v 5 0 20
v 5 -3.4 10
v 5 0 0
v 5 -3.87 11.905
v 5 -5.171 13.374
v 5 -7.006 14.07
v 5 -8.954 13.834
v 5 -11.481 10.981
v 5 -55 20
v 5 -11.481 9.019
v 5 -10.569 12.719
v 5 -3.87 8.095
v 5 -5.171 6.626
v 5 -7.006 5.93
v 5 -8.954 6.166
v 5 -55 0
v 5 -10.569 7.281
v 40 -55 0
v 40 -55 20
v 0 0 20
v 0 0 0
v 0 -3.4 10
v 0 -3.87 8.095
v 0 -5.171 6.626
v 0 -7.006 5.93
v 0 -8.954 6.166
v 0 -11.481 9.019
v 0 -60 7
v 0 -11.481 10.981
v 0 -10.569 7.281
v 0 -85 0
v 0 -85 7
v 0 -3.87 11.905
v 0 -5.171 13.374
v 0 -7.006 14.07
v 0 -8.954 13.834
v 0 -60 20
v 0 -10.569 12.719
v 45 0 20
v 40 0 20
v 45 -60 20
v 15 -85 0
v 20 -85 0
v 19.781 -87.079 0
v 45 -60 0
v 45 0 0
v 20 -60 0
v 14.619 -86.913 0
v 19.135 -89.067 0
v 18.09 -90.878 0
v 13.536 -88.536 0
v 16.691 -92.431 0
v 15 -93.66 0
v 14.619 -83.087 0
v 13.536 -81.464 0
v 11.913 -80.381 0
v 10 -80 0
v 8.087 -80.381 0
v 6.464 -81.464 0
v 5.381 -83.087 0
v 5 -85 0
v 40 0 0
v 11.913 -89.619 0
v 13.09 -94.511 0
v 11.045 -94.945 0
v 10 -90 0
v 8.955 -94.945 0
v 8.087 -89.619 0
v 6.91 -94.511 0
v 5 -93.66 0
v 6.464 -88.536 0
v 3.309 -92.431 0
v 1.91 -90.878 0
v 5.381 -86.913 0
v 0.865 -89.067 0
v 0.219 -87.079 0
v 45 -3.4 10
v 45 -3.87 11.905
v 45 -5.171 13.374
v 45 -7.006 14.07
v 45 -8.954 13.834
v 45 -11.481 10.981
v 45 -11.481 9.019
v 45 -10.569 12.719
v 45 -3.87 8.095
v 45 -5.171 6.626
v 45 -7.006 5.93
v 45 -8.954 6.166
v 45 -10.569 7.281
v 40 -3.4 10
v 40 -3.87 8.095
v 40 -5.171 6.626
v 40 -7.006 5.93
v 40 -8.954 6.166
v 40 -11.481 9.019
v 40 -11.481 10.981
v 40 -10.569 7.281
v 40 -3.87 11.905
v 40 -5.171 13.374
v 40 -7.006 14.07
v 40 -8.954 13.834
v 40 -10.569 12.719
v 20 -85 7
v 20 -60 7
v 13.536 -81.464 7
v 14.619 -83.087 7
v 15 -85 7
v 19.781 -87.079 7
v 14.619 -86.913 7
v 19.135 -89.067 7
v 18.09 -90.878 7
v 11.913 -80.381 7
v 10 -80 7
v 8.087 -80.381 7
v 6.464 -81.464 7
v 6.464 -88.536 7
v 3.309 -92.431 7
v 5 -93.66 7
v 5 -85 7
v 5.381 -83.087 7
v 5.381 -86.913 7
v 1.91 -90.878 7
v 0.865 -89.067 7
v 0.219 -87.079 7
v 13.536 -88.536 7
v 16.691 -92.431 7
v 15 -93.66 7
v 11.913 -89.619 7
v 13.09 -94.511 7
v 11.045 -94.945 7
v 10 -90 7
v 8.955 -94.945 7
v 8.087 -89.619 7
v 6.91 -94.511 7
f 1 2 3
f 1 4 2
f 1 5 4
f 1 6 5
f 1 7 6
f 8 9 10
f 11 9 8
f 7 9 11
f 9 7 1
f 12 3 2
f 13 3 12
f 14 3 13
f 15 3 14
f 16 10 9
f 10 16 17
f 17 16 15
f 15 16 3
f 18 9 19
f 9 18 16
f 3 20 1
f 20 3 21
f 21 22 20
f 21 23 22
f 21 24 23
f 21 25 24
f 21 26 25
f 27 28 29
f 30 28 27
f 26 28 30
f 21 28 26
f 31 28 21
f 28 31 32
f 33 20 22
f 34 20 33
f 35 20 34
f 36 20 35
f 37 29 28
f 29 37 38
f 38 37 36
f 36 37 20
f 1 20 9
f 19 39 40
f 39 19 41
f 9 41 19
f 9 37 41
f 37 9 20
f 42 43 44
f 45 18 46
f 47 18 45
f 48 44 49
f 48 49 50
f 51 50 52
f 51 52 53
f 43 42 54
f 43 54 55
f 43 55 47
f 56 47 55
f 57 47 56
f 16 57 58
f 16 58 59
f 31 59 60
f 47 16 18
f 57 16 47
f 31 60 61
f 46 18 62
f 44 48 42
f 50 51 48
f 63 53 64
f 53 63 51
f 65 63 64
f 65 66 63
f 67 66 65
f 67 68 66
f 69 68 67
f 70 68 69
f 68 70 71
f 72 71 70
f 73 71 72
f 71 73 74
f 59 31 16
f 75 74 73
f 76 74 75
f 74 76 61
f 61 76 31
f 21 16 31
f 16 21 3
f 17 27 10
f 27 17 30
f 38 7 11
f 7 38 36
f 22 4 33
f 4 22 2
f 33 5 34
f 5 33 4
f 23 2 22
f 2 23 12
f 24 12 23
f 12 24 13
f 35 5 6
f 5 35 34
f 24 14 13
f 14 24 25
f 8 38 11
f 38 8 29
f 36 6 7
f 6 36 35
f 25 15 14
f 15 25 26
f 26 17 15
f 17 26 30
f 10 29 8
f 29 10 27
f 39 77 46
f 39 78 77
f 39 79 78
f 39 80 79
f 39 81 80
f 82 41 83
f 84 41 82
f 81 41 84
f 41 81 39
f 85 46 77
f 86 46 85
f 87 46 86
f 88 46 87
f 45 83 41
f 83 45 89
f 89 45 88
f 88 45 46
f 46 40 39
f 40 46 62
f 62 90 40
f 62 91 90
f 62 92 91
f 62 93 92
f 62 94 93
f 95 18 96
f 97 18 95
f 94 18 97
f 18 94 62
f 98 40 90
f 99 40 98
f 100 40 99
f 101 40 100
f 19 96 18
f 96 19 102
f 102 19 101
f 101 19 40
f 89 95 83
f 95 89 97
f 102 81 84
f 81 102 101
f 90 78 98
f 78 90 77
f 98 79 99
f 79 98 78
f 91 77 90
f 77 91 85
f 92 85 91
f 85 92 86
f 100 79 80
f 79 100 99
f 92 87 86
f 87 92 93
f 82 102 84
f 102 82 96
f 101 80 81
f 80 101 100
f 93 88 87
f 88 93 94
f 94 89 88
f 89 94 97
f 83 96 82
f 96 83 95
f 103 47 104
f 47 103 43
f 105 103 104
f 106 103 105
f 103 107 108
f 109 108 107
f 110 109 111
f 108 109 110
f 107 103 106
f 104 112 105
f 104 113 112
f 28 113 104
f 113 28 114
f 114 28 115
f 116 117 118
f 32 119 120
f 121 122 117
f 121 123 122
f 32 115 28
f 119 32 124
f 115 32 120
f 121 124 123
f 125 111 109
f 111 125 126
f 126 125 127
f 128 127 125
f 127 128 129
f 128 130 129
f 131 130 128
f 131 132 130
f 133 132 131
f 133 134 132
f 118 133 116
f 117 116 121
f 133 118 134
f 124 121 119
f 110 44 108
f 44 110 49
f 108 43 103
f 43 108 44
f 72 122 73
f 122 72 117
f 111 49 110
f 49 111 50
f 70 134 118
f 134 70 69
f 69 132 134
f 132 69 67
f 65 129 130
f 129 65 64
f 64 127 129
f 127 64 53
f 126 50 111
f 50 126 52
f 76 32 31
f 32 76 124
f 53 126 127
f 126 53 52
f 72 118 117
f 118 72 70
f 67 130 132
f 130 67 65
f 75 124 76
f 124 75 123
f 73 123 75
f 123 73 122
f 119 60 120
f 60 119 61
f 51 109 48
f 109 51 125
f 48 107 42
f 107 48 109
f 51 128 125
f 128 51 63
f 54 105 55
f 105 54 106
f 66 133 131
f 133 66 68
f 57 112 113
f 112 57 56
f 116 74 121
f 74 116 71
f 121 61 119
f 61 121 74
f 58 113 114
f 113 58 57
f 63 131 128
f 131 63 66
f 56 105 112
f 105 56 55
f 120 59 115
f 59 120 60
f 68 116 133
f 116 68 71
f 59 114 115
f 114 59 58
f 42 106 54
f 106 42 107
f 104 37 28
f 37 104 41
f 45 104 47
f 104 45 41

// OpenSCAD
//square width
sw = 40;

//rod diameter
rd = 10;

//screw diameter
sd = 8.2;

//screw padding
sp = 15;

//thickness
th = 5;

//hanger height
hh = 40;

//hanger thickness
hth = 7;

//hanger width
hw = 20;


rotate([90,0,0])
bag_hanger();



module bag_hanger()
{
fastener();


translate([sw,0,0])
fastener();

translate([0,0,sw+sp])
cube([sw+th,sw/2,th]);

translate([0,0,sw+sp])
{
hanger();
}

}


module fastener()
{
difference()
{
cube([th,sw/2,sw+sp]);
translate([-th*.5,sw/4,sp/2])
rotate([0,90,0])
cylinder(d=sd, h=th*2);
}
}


module hanger()
{
difference()
{
union()
{
cube([hw,hth,hh-hw/2]);
translate([hw/2,hth,hh-hw/2])
rotate([90,0,0])
cylinder(d=hw, h=hth);
}

translate([hw/2,hth*1.5,hh-hw/2])
rotate([90,0,0])
cylinder(d=rd, h=hth*2);
}

}
